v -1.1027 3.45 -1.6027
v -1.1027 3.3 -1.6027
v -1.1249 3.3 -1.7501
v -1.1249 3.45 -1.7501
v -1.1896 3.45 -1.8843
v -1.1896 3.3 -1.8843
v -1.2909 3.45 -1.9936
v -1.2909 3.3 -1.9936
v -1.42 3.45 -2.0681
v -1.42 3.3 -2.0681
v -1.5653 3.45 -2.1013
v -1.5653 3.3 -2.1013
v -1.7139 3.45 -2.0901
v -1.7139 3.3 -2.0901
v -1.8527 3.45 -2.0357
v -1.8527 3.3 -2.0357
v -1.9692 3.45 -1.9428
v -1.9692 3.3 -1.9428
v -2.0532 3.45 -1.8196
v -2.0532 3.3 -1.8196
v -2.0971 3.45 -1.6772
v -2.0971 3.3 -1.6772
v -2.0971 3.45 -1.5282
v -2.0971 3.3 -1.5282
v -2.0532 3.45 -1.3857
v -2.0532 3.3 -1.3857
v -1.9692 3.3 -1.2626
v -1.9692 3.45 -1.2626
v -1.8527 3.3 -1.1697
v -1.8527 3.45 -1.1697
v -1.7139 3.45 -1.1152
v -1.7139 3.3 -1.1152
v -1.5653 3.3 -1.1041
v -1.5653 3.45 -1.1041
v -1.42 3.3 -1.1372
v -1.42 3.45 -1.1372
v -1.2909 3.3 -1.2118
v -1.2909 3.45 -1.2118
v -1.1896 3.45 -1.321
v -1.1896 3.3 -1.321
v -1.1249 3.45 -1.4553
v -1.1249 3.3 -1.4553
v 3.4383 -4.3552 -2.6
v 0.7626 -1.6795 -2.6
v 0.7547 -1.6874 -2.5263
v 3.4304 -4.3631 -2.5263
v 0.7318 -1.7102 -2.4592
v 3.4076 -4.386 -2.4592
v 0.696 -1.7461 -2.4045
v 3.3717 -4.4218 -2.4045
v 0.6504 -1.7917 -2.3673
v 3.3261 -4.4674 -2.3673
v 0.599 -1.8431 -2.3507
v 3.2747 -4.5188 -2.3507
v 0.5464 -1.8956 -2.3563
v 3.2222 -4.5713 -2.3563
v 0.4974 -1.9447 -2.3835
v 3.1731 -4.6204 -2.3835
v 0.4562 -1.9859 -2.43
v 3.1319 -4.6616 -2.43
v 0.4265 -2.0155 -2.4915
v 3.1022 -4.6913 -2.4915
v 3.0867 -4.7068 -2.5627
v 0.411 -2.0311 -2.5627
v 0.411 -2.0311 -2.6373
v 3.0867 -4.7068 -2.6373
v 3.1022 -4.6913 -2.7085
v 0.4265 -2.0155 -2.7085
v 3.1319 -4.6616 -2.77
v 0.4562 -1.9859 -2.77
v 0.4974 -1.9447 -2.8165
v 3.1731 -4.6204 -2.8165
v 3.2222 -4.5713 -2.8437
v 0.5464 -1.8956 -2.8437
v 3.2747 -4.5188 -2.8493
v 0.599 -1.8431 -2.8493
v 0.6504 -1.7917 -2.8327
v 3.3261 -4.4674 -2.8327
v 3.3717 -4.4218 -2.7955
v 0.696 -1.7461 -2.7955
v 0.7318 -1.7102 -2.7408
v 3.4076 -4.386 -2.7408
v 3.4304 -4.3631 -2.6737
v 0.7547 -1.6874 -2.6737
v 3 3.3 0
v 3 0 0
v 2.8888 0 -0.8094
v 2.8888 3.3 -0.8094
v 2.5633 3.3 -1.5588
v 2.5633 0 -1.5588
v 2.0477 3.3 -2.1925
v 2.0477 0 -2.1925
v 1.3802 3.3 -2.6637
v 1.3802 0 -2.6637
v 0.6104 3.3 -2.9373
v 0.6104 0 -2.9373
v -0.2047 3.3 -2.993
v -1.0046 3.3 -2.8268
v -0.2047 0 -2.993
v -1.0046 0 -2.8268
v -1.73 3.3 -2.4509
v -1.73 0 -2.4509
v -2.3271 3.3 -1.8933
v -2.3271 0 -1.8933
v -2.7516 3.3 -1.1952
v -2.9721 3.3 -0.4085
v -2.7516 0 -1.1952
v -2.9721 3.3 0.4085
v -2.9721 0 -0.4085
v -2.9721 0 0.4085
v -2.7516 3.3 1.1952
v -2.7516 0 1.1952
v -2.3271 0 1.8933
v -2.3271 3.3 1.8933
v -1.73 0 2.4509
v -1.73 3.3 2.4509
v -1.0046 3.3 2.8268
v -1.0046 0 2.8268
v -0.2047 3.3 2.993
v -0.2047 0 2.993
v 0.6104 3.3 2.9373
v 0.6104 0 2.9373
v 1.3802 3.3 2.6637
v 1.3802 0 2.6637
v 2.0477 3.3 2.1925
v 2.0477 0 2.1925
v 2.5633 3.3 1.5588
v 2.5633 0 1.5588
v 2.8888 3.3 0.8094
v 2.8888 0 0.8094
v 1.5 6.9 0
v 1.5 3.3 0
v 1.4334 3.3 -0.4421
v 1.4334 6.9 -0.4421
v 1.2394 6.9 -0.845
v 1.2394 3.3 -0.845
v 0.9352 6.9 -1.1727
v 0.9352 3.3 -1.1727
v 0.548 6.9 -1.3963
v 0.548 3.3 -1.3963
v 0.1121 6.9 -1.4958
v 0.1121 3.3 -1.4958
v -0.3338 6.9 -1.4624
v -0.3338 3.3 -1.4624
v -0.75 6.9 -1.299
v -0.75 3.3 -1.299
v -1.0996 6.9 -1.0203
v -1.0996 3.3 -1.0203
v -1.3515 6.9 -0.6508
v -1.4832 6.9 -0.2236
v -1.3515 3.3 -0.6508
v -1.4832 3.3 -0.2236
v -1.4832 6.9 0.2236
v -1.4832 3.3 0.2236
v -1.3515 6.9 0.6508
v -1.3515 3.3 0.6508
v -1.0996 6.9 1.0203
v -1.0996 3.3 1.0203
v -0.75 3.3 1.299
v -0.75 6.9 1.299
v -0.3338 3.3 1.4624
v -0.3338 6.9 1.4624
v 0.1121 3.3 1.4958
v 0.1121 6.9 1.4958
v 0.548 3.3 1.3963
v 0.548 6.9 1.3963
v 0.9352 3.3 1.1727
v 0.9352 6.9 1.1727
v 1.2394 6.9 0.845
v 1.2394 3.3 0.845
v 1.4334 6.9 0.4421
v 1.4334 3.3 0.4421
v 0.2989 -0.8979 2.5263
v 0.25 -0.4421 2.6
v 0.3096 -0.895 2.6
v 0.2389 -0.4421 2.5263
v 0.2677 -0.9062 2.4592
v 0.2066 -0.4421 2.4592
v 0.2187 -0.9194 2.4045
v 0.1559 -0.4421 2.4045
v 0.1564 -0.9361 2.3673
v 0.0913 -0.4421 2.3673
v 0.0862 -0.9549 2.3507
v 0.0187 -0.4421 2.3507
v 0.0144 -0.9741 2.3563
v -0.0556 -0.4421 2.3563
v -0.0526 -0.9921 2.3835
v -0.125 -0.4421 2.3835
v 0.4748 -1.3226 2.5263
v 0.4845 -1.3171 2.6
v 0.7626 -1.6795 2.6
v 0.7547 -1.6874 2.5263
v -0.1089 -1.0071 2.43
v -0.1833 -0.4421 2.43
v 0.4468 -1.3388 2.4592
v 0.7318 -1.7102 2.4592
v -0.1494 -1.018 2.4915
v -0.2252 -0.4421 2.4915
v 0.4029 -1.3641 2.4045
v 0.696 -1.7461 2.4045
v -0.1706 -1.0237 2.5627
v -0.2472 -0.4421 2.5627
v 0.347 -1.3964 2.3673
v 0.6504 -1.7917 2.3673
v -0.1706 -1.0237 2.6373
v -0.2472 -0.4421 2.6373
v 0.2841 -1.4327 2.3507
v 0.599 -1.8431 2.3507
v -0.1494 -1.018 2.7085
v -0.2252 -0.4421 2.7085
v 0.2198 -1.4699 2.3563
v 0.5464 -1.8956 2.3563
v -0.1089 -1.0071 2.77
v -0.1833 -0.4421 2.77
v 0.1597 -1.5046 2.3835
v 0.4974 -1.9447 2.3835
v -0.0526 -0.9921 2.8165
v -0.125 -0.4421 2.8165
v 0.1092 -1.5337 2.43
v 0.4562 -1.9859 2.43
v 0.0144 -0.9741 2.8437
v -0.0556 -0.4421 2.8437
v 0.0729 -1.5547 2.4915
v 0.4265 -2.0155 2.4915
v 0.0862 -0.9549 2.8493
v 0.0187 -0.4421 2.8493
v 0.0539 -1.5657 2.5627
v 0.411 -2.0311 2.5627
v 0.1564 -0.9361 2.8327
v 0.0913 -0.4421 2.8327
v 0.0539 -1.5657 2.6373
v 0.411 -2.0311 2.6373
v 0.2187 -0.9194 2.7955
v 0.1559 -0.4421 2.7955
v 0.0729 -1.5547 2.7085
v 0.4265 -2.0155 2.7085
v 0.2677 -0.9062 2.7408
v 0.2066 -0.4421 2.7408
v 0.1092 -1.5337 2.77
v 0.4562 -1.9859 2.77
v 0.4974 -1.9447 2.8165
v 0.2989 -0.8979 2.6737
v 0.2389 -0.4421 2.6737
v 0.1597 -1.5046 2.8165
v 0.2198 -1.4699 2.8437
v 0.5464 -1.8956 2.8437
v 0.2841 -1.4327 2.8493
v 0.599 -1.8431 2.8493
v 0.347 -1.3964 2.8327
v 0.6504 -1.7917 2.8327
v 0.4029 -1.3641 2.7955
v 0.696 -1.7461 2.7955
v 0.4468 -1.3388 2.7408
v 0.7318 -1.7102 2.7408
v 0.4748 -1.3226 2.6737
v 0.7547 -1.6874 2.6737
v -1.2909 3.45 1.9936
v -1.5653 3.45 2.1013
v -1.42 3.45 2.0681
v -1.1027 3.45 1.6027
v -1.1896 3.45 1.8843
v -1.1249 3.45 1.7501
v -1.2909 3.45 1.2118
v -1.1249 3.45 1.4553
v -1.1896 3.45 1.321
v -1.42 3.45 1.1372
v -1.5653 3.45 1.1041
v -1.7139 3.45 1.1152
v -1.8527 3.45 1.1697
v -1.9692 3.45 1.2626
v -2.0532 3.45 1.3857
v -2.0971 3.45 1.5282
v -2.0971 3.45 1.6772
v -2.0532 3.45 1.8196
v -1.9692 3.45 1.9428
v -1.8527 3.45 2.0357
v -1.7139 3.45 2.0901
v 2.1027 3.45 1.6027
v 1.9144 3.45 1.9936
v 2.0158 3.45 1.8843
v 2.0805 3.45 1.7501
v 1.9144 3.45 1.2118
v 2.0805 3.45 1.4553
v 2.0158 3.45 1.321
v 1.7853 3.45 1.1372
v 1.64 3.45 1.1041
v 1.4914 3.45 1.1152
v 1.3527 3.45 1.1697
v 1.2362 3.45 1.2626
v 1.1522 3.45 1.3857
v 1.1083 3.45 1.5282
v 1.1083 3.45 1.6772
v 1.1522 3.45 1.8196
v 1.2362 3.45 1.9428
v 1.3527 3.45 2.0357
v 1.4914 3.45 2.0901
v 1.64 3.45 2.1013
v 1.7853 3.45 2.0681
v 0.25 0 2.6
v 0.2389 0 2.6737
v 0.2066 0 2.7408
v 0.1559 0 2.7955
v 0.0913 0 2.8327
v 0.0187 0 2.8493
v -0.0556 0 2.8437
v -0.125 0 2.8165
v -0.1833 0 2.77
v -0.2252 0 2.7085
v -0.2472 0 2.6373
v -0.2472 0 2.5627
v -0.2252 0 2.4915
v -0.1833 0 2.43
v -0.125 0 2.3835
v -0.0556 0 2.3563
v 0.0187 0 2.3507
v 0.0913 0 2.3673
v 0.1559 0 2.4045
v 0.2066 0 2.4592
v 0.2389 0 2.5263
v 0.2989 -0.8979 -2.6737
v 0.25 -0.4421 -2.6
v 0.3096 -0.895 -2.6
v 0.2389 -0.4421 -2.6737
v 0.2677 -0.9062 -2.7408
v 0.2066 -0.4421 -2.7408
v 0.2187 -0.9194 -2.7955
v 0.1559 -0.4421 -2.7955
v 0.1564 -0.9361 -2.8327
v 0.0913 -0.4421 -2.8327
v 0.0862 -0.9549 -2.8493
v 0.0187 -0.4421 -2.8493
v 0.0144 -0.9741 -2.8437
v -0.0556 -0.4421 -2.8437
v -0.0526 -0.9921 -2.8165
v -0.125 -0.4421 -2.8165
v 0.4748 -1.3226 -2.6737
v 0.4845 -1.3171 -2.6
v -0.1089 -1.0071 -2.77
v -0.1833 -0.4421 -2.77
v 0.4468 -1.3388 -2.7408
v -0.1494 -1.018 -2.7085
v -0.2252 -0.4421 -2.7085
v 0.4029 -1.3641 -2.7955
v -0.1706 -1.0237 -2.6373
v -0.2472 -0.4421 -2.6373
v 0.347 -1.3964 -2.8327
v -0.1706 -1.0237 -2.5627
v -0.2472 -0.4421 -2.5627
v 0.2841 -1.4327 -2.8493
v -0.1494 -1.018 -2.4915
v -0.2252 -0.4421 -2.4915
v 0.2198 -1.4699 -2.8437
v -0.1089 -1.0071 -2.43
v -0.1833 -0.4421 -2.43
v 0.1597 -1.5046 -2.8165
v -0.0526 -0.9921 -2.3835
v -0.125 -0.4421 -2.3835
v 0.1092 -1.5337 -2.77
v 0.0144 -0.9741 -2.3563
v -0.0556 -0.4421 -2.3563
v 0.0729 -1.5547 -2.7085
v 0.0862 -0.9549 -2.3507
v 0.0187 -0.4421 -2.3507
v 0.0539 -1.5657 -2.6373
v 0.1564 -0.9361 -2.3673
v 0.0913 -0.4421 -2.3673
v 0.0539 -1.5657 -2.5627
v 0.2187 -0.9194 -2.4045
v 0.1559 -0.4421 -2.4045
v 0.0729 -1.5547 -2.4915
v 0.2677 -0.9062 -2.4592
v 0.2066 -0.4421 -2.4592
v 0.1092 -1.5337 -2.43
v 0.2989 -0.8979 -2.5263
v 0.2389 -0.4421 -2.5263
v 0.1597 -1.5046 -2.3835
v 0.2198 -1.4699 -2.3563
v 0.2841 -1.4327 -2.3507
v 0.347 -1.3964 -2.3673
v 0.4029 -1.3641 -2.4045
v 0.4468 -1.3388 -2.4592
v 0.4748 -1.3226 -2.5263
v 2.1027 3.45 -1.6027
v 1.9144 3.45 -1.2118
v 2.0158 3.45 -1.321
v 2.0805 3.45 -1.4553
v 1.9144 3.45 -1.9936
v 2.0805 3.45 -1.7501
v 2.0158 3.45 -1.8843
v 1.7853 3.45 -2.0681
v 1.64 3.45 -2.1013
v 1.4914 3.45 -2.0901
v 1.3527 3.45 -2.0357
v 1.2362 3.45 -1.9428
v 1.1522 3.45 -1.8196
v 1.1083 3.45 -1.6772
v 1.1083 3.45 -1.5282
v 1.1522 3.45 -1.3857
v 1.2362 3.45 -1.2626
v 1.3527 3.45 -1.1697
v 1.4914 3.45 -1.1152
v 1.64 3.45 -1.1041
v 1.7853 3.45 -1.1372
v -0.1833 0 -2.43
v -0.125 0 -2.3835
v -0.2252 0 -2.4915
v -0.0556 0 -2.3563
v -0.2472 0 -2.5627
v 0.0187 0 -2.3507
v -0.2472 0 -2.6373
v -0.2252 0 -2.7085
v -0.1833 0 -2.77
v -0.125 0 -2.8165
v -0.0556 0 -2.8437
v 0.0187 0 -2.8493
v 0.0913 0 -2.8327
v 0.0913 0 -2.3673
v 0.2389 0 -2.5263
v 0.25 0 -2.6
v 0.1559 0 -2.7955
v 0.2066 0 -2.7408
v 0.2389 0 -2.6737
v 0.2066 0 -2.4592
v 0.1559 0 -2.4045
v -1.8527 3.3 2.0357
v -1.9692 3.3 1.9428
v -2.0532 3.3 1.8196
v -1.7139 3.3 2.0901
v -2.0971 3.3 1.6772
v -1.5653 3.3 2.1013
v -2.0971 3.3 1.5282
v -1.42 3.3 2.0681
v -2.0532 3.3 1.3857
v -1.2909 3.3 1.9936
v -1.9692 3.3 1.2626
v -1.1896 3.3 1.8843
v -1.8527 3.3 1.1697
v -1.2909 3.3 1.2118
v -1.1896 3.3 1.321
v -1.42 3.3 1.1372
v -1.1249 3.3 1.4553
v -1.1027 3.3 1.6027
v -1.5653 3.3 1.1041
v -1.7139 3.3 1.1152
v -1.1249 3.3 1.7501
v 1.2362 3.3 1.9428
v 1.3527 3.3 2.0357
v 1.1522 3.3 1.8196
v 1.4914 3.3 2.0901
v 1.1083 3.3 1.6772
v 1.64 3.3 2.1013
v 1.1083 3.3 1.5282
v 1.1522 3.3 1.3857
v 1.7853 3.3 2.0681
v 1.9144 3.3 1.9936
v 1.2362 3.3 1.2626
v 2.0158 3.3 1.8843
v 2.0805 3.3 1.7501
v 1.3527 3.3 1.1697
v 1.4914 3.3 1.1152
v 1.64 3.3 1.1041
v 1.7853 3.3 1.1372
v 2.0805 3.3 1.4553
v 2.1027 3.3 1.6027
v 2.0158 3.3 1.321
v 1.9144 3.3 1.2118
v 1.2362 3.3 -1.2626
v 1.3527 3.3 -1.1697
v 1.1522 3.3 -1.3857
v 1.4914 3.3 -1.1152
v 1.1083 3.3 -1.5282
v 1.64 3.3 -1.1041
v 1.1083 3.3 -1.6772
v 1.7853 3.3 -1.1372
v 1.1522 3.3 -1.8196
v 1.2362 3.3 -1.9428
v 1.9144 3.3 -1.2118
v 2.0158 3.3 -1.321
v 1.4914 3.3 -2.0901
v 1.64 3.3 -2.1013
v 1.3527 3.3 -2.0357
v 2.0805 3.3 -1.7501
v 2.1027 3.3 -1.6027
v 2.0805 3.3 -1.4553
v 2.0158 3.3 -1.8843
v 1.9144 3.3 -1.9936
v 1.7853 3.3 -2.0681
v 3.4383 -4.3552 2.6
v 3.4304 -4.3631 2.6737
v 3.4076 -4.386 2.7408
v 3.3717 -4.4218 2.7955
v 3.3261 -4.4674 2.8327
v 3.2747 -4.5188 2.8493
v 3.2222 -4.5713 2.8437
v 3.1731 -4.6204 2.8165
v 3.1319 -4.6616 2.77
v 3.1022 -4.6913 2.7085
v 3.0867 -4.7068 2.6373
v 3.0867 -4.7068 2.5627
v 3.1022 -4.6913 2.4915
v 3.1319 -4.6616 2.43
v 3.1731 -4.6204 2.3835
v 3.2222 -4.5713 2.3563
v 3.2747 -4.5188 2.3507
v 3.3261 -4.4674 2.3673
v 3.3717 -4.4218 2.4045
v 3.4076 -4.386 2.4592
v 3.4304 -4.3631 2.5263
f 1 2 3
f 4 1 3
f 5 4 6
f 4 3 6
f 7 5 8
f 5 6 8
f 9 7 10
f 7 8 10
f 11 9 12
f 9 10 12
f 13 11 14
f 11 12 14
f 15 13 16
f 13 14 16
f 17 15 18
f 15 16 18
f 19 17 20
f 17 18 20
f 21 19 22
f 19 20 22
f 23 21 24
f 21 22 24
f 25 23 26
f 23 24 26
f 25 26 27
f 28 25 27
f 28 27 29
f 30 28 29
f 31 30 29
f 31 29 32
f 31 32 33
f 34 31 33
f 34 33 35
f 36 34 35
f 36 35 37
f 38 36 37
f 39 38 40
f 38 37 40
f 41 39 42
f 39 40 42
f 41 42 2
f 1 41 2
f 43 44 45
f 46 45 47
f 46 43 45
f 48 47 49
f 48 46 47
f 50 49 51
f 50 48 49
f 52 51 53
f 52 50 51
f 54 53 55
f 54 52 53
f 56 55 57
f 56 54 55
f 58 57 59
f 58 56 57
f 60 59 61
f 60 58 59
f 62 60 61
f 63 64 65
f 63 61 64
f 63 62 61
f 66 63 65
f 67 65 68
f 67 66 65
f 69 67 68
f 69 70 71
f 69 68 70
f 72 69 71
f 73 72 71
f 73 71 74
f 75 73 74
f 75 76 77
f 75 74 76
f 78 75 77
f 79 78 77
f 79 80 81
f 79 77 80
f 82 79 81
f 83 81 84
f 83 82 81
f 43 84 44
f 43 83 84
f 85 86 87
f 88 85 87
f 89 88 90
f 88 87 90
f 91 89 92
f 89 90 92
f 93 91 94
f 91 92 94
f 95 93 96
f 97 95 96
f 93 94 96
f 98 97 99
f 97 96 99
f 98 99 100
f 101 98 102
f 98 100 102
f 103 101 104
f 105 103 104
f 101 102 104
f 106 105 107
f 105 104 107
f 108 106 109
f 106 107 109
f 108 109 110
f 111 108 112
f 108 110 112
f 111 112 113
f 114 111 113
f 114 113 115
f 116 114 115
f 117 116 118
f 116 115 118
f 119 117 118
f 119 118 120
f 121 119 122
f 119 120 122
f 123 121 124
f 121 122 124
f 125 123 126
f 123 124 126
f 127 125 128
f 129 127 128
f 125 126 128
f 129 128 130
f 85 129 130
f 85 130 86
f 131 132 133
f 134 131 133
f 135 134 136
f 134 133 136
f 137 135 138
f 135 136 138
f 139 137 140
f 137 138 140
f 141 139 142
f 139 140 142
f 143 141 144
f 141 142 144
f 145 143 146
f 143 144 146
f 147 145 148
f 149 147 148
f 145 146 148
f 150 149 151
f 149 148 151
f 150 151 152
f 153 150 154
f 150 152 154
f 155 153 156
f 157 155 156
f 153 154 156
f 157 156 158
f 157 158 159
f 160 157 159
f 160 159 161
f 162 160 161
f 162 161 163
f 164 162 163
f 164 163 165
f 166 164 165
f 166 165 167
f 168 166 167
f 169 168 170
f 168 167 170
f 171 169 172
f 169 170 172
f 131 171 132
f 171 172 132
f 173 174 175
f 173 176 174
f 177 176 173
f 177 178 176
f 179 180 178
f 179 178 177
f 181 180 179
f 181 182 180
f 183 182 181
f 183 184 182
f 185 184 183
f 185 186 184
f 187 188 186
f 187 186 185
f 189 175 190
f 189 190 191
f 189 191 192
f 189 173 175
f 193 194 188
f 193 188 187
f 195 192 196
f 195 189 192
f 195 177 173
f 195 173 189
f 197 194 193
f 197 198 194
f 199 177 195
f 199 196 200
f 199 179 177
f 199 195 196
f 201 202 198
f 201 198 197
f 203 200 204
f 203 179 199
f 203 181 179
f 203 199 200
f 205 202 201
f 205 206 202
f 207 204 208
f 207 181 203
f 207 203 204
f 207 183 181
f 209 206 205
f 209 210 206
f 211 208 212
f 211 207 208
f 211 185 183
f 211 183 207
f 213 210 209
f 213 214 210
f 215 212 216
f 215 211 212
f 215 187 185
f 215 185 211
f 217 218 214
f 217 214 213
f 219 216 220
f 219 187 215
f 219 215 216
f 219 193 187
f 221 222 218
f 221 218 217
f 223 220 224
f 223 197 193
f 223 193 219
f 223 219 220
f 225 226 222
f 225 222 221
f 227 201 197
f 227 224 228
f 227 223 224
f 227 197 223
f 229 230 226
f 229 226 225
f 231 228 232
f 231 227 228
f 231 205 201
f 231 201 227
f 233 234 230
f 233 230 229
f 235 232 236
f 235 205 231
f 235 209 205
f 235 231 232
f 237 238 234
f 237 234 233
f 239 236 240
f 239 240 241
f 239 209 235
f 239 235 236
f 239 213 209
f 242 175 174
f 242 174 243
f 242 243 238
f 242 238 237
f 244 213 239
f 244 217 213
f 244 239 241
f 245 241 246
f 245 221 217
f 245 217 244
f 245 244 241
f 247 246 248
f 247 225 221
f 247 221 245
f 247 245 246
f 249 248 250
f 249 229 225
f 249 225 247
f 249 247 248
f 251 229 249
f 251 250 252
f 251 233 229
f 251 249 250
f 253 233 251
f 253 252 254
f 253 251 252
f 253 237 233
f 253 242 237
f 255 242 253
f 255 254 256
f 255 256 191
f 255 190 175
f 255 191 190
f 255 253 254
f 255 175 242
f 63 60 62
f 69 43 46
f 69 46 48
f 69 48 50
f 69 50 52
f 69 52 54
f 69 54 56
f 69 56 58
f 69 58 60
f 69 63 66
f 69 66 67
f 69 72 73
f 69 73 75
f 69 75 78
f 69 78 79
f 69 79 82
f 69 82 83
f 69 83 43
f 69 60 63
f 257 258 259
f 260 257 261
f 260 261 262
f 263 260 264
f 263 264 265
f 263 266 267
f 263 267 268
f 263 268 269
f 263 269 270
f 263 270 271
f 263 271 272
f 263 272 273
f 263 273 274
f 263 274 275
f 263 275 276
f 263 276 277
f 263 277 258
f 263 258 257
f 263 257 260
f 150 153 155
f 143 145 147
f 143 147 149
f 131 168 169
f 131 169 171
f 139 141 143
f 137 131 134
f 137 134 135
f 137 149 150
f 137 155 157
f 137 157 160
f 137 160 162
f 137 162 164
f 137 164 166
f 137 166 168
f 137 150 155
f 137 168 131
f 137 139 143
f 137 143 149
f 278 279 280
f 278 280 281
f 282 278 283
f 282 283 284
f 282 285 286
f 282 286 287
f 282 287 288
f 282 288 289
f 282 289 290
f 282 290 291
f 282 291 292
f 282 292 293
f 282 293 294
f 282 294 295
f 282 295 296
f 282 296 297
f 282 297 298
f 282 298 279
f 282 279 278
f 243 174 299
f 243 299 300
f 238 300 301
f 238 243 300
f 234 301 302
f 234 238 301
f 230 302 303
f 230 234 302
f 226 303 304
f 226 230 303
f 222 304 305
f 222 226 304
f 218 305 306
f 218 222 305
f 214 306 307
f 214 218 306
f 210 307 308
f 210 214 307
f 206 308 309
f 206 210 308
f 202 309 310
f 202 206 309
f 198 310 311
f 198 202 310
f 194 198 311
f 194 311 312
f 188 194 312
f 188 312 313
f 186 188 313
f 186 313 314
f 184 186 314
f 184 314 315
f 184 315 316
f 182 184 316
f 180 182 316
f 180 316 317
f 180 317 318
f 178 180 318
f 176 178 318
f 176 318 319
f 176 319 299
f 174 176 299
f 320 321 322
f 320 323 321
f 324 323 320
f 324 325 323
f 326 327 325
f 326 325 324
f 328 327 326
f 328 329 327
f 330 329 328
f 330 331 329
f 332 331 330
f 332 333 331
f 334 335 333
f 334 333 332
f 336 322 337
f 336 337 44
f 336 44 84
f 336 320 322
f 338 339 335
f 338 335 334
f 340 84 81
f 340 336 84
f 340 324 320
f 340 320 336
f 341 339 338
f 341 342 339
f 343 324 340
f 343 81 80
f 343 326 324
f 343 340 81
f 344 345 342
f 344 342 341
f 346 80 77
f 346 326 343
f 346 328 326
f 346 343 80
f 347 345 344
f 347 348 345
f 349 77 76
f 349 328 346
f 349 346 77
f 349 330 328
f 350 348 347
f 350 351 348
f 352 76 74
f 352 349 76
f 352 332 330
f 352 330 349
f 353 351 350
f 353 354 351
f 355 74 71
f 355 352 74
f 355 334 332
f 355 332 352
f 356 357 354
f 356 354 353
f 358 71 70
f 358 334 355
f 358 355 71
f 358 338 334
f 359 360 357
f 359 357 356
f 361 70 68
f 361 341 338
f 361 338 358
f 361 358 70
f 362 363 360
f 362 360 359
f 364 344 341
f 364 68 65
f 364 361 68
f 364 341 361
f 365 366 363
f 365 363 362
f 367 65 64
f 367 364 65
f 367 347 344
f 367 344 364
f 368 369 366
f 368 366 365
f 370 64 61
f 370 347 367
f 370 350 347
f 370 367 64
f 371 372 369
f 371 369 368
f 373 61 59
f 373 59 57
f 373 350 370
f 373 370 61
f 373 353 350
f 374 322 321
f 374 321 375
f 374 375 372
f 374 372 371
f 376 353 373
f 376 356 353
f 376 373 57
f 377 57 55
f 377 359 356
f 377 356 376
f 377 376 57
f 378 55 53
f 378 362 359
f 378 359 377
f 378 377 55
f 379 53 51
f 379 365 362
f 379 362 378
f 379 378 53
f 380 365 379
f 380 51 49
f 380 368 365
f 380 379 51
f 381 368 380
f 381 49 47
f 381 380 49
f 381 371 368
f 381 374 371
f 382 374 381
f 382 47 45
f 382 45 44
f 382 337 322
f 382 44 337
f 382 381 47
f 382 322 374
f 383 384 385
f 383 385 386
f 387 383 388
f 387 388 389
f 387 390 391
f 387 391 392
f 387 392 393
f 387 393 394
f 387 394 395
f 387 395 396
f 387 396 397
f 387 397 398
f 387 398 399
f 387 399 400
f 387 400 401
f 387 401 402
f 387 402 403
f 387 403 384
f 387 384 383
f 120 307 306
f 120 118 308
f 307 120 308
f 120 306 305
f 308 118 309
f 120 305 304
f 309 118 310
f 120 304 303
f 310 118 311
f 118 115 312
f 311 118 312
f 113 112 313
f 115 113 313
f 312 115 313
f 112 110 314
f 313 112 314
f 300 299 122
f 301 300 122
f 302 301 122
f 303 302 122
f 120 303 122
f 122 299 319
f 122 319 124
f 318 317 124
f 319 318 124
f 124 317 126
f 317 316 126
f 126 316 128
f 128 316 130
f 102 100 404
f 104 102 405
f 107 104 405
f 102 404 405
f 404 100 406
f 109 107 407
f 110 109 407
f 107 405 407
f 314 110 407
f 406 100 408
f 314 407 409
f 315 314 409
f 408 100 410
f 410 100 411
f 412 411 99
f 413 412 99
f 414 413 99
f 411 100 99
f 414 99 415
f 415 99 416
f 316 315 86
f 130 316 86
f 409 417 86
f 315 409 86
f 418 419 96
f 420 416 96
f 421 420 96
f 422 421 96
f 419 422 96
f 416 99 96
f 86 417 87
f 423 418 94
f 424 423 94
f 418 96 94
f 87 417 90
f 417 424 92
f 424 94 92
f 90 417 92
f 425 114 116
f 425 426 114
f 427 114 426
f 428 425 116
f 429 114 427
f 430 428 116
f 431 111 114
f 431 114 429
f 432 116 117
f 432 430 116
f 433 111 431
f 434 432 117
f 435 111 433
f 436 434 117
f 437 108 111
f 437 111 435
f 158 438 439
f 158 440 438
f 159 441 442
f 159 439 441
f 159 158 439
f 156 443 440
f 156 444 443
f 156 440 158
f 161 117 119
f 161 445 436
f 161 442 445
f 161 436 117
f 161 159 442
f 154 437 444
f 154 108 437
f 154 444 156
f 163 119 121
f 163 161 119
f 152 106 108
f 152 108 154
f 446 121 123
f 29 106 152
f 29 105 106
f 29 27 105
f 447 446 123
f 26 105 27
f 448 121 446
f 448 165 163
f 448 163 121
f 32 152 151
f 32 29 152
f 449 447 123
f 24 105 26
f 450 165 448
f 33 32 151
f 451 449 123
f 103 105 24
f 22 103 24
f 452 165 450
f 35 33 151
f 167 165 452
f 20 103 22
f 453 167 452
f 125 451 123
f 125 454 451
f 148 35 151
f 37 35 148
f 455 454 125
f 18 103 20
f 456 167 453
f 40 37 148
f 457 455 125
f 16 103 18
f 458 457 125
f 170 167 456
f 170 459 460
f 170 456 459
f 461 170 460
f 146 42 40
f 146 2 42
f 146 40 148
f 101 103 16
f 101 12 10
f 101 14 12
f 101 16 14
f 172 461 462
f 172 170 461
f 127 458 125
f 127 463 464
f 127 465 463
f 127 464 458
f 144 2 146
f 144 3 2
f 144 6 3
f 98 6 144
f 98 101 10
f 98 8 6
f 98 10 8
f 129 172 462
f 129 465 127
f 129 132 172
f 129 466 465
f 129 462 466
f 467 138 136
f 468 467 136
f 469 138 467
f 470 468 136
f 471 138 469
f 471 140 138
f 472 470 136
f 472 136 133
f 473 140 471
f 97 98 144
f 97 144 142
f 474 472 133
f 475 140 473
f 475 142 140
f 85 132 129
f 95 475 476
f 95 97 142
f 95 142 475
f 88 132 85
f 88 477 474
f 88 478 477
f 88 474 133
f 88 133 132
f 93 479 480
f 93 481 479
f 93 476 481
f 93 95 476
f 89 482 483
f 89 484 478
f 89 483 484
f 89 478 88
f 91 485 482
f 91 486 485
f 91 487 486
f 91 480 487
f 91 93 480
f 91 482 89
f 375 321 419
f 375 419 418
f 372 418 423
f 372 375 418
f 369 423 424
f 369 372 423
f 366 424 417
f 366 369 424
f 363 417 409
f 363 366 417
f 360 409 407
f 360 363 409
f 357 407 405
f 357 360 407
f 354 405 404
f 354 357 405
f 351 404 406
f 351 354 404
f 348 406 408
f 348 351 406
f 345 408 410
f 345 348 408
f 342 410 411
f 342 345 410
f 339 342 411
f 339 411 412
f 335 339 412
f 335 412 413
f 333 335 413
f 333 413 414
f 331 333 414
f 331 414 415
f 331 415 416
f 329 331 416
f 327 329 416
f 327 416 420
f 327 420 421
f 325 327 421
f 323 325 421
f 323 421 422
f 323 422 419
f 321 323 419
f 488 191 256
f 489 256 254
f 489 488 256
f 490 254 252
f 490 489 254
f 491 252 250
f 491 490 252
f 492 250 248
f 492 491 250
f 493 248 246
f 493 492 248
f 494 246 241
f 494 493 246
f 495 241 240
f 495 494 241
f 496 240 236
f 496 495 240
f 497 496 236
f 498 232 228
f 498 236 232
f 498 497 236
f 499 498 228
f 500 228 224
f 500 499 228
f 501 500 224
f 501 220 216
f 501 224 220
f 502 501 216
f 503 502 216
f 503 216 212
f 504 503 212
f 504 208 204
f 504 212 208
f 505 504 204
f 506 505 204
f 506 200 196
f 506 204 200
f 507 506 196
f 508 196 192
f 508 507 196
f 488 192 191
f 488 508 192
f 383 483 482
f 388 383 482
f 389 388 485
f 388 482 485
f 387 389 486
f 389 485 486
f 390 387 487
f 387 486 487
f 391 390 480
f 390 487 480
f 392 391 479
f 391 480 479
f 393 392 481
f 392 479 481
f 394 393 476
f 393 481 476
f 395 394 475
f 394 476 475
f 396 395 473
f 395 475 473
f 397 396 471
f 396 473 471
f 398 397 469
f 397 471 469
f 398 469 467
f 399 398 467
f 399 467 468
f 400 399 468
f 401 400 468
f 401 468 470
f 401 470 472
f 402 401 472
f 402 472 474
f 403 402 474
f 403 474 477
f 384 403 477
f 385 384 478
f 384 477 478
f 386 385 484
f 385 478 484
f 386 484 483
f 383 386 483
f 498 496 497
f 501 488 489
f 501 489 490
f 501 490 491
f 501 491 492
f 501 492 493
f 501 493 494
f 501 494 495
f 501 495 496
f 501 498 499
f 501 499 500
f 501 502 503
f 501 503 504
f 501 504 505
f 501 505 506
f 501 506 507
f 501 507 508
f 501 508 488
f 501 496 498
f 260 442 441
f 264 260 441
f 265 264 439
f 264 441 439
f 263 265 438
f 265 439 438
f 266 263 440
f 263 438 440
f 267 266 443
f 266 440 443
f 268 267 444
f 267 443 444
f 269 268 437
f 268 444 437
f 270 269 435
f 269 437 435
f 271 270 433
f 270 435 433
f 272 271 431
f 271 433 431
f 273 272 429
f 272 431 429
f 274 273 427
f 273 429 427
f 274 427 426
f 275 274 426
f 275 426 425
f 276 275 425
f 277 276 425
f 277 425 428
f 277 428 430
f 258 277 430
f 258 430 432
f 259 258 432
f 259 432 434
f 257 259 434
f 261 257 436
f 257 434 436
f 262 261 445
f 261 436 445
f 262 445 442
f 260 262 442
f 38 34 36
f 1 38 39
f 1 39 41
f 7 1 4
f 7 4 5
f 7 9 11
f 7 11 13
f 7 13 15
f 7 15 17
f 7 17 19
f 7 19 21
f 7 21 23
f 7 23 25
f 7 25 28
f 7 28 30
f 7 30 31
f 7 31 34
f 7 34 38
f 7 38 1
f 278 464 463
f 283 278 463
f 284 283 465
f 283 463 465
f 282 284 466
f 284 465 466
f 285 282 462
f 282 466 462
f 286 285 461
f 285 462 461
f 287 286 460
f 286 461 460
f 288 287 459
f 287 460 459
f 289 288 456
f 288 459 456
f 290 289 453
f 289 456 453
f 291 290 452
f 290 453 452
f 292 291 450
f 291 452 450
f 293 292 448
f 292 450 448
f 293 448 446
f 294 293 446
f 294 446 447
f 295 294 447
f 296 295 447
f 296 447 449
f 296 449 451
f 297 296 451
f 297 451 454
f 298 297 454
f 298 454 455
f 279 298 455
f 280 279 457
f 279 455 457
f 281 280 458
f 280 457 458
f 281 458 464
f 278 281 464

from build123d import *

# Parameters (mm, degrees)
SKETCH1_R           = 3
BOSS_EXTRUDE1_DEPTH = 3.3
SKETCH2_R           = 1.5
BOSS_EXTRUDE2_DEPTH = 3.6
SKETCH4_R           = 0.5
BOSS_EXTRUDE4_DEPTH = 0.15
SKETCH3_R           = 0.25


with BuildPart() as part:
    # Sketch1 → Boss-Extrude1 (new body)
    with BuildSketch(Plane(origin=(0, 0, 0), x_dir=(1, 0, 0), z_dir=(0, 1, 0))):
        Circle(SKETCH1_R)
    extrude(amount=BOSS_EXTRUDE1_DEPTH)

    # Sketch2 → Boss-Extrude2 (add)
    with BuildSketch(Plane(origin=(0, 3.3, 0), x_dir=(1, 0, 0), z_dir=(0, 1, 0))):
        Circle(SKETCH2_R)
    extrude(amount=BOSS_EXTRUDE2_DEPTH)

    # Sketch4 → Boss-Extrude4 (add)
    with BuildSketch(Plane(origin=(0, 3.3, 0), x_dir=(1, 0, 0), z_dir=(0, 1, 0))):
        with Locations((-1.60267659, 1.60267659)):
            Circle(SKETCH4_R)
        with Locations((1.60267659, 1.60267659)):
            Circle(SKETCH4_R)
        with Locations((-1.60267659, -1.60267659)):
            Circle(SKETCH4_R)
        with Locations((1.60267659, -1.60267659)):
            Circle(SKETCH4_R)
    extrude(amount=BOSS_EXTRUDE4_DEPTH)

    # Sweep2: sweep along a path in Sketch5
    with BuildLine(Plane.XY) as sweep2_path:
        Line((0, 0), (0, -0.442064994))
        ThreePointArc((0, -0.442064994), (0.152240935, -1.207431859), (0.585786438, -1.856278556))
        Line((0.585786438, -1.856278556), (3.261520237, -4.532012355))
    # Sketch3 → Sweep2 (sweep)
    with BuildSketch(Plane.XZ):
        with Locations((0, 2.6)):
            Circle(SKETCH3_R)
        with Locations((0, -2.6)):
            Circle(SKETCH3_R)
    sweep(path=sweep2_path.line)


solid = part.part
